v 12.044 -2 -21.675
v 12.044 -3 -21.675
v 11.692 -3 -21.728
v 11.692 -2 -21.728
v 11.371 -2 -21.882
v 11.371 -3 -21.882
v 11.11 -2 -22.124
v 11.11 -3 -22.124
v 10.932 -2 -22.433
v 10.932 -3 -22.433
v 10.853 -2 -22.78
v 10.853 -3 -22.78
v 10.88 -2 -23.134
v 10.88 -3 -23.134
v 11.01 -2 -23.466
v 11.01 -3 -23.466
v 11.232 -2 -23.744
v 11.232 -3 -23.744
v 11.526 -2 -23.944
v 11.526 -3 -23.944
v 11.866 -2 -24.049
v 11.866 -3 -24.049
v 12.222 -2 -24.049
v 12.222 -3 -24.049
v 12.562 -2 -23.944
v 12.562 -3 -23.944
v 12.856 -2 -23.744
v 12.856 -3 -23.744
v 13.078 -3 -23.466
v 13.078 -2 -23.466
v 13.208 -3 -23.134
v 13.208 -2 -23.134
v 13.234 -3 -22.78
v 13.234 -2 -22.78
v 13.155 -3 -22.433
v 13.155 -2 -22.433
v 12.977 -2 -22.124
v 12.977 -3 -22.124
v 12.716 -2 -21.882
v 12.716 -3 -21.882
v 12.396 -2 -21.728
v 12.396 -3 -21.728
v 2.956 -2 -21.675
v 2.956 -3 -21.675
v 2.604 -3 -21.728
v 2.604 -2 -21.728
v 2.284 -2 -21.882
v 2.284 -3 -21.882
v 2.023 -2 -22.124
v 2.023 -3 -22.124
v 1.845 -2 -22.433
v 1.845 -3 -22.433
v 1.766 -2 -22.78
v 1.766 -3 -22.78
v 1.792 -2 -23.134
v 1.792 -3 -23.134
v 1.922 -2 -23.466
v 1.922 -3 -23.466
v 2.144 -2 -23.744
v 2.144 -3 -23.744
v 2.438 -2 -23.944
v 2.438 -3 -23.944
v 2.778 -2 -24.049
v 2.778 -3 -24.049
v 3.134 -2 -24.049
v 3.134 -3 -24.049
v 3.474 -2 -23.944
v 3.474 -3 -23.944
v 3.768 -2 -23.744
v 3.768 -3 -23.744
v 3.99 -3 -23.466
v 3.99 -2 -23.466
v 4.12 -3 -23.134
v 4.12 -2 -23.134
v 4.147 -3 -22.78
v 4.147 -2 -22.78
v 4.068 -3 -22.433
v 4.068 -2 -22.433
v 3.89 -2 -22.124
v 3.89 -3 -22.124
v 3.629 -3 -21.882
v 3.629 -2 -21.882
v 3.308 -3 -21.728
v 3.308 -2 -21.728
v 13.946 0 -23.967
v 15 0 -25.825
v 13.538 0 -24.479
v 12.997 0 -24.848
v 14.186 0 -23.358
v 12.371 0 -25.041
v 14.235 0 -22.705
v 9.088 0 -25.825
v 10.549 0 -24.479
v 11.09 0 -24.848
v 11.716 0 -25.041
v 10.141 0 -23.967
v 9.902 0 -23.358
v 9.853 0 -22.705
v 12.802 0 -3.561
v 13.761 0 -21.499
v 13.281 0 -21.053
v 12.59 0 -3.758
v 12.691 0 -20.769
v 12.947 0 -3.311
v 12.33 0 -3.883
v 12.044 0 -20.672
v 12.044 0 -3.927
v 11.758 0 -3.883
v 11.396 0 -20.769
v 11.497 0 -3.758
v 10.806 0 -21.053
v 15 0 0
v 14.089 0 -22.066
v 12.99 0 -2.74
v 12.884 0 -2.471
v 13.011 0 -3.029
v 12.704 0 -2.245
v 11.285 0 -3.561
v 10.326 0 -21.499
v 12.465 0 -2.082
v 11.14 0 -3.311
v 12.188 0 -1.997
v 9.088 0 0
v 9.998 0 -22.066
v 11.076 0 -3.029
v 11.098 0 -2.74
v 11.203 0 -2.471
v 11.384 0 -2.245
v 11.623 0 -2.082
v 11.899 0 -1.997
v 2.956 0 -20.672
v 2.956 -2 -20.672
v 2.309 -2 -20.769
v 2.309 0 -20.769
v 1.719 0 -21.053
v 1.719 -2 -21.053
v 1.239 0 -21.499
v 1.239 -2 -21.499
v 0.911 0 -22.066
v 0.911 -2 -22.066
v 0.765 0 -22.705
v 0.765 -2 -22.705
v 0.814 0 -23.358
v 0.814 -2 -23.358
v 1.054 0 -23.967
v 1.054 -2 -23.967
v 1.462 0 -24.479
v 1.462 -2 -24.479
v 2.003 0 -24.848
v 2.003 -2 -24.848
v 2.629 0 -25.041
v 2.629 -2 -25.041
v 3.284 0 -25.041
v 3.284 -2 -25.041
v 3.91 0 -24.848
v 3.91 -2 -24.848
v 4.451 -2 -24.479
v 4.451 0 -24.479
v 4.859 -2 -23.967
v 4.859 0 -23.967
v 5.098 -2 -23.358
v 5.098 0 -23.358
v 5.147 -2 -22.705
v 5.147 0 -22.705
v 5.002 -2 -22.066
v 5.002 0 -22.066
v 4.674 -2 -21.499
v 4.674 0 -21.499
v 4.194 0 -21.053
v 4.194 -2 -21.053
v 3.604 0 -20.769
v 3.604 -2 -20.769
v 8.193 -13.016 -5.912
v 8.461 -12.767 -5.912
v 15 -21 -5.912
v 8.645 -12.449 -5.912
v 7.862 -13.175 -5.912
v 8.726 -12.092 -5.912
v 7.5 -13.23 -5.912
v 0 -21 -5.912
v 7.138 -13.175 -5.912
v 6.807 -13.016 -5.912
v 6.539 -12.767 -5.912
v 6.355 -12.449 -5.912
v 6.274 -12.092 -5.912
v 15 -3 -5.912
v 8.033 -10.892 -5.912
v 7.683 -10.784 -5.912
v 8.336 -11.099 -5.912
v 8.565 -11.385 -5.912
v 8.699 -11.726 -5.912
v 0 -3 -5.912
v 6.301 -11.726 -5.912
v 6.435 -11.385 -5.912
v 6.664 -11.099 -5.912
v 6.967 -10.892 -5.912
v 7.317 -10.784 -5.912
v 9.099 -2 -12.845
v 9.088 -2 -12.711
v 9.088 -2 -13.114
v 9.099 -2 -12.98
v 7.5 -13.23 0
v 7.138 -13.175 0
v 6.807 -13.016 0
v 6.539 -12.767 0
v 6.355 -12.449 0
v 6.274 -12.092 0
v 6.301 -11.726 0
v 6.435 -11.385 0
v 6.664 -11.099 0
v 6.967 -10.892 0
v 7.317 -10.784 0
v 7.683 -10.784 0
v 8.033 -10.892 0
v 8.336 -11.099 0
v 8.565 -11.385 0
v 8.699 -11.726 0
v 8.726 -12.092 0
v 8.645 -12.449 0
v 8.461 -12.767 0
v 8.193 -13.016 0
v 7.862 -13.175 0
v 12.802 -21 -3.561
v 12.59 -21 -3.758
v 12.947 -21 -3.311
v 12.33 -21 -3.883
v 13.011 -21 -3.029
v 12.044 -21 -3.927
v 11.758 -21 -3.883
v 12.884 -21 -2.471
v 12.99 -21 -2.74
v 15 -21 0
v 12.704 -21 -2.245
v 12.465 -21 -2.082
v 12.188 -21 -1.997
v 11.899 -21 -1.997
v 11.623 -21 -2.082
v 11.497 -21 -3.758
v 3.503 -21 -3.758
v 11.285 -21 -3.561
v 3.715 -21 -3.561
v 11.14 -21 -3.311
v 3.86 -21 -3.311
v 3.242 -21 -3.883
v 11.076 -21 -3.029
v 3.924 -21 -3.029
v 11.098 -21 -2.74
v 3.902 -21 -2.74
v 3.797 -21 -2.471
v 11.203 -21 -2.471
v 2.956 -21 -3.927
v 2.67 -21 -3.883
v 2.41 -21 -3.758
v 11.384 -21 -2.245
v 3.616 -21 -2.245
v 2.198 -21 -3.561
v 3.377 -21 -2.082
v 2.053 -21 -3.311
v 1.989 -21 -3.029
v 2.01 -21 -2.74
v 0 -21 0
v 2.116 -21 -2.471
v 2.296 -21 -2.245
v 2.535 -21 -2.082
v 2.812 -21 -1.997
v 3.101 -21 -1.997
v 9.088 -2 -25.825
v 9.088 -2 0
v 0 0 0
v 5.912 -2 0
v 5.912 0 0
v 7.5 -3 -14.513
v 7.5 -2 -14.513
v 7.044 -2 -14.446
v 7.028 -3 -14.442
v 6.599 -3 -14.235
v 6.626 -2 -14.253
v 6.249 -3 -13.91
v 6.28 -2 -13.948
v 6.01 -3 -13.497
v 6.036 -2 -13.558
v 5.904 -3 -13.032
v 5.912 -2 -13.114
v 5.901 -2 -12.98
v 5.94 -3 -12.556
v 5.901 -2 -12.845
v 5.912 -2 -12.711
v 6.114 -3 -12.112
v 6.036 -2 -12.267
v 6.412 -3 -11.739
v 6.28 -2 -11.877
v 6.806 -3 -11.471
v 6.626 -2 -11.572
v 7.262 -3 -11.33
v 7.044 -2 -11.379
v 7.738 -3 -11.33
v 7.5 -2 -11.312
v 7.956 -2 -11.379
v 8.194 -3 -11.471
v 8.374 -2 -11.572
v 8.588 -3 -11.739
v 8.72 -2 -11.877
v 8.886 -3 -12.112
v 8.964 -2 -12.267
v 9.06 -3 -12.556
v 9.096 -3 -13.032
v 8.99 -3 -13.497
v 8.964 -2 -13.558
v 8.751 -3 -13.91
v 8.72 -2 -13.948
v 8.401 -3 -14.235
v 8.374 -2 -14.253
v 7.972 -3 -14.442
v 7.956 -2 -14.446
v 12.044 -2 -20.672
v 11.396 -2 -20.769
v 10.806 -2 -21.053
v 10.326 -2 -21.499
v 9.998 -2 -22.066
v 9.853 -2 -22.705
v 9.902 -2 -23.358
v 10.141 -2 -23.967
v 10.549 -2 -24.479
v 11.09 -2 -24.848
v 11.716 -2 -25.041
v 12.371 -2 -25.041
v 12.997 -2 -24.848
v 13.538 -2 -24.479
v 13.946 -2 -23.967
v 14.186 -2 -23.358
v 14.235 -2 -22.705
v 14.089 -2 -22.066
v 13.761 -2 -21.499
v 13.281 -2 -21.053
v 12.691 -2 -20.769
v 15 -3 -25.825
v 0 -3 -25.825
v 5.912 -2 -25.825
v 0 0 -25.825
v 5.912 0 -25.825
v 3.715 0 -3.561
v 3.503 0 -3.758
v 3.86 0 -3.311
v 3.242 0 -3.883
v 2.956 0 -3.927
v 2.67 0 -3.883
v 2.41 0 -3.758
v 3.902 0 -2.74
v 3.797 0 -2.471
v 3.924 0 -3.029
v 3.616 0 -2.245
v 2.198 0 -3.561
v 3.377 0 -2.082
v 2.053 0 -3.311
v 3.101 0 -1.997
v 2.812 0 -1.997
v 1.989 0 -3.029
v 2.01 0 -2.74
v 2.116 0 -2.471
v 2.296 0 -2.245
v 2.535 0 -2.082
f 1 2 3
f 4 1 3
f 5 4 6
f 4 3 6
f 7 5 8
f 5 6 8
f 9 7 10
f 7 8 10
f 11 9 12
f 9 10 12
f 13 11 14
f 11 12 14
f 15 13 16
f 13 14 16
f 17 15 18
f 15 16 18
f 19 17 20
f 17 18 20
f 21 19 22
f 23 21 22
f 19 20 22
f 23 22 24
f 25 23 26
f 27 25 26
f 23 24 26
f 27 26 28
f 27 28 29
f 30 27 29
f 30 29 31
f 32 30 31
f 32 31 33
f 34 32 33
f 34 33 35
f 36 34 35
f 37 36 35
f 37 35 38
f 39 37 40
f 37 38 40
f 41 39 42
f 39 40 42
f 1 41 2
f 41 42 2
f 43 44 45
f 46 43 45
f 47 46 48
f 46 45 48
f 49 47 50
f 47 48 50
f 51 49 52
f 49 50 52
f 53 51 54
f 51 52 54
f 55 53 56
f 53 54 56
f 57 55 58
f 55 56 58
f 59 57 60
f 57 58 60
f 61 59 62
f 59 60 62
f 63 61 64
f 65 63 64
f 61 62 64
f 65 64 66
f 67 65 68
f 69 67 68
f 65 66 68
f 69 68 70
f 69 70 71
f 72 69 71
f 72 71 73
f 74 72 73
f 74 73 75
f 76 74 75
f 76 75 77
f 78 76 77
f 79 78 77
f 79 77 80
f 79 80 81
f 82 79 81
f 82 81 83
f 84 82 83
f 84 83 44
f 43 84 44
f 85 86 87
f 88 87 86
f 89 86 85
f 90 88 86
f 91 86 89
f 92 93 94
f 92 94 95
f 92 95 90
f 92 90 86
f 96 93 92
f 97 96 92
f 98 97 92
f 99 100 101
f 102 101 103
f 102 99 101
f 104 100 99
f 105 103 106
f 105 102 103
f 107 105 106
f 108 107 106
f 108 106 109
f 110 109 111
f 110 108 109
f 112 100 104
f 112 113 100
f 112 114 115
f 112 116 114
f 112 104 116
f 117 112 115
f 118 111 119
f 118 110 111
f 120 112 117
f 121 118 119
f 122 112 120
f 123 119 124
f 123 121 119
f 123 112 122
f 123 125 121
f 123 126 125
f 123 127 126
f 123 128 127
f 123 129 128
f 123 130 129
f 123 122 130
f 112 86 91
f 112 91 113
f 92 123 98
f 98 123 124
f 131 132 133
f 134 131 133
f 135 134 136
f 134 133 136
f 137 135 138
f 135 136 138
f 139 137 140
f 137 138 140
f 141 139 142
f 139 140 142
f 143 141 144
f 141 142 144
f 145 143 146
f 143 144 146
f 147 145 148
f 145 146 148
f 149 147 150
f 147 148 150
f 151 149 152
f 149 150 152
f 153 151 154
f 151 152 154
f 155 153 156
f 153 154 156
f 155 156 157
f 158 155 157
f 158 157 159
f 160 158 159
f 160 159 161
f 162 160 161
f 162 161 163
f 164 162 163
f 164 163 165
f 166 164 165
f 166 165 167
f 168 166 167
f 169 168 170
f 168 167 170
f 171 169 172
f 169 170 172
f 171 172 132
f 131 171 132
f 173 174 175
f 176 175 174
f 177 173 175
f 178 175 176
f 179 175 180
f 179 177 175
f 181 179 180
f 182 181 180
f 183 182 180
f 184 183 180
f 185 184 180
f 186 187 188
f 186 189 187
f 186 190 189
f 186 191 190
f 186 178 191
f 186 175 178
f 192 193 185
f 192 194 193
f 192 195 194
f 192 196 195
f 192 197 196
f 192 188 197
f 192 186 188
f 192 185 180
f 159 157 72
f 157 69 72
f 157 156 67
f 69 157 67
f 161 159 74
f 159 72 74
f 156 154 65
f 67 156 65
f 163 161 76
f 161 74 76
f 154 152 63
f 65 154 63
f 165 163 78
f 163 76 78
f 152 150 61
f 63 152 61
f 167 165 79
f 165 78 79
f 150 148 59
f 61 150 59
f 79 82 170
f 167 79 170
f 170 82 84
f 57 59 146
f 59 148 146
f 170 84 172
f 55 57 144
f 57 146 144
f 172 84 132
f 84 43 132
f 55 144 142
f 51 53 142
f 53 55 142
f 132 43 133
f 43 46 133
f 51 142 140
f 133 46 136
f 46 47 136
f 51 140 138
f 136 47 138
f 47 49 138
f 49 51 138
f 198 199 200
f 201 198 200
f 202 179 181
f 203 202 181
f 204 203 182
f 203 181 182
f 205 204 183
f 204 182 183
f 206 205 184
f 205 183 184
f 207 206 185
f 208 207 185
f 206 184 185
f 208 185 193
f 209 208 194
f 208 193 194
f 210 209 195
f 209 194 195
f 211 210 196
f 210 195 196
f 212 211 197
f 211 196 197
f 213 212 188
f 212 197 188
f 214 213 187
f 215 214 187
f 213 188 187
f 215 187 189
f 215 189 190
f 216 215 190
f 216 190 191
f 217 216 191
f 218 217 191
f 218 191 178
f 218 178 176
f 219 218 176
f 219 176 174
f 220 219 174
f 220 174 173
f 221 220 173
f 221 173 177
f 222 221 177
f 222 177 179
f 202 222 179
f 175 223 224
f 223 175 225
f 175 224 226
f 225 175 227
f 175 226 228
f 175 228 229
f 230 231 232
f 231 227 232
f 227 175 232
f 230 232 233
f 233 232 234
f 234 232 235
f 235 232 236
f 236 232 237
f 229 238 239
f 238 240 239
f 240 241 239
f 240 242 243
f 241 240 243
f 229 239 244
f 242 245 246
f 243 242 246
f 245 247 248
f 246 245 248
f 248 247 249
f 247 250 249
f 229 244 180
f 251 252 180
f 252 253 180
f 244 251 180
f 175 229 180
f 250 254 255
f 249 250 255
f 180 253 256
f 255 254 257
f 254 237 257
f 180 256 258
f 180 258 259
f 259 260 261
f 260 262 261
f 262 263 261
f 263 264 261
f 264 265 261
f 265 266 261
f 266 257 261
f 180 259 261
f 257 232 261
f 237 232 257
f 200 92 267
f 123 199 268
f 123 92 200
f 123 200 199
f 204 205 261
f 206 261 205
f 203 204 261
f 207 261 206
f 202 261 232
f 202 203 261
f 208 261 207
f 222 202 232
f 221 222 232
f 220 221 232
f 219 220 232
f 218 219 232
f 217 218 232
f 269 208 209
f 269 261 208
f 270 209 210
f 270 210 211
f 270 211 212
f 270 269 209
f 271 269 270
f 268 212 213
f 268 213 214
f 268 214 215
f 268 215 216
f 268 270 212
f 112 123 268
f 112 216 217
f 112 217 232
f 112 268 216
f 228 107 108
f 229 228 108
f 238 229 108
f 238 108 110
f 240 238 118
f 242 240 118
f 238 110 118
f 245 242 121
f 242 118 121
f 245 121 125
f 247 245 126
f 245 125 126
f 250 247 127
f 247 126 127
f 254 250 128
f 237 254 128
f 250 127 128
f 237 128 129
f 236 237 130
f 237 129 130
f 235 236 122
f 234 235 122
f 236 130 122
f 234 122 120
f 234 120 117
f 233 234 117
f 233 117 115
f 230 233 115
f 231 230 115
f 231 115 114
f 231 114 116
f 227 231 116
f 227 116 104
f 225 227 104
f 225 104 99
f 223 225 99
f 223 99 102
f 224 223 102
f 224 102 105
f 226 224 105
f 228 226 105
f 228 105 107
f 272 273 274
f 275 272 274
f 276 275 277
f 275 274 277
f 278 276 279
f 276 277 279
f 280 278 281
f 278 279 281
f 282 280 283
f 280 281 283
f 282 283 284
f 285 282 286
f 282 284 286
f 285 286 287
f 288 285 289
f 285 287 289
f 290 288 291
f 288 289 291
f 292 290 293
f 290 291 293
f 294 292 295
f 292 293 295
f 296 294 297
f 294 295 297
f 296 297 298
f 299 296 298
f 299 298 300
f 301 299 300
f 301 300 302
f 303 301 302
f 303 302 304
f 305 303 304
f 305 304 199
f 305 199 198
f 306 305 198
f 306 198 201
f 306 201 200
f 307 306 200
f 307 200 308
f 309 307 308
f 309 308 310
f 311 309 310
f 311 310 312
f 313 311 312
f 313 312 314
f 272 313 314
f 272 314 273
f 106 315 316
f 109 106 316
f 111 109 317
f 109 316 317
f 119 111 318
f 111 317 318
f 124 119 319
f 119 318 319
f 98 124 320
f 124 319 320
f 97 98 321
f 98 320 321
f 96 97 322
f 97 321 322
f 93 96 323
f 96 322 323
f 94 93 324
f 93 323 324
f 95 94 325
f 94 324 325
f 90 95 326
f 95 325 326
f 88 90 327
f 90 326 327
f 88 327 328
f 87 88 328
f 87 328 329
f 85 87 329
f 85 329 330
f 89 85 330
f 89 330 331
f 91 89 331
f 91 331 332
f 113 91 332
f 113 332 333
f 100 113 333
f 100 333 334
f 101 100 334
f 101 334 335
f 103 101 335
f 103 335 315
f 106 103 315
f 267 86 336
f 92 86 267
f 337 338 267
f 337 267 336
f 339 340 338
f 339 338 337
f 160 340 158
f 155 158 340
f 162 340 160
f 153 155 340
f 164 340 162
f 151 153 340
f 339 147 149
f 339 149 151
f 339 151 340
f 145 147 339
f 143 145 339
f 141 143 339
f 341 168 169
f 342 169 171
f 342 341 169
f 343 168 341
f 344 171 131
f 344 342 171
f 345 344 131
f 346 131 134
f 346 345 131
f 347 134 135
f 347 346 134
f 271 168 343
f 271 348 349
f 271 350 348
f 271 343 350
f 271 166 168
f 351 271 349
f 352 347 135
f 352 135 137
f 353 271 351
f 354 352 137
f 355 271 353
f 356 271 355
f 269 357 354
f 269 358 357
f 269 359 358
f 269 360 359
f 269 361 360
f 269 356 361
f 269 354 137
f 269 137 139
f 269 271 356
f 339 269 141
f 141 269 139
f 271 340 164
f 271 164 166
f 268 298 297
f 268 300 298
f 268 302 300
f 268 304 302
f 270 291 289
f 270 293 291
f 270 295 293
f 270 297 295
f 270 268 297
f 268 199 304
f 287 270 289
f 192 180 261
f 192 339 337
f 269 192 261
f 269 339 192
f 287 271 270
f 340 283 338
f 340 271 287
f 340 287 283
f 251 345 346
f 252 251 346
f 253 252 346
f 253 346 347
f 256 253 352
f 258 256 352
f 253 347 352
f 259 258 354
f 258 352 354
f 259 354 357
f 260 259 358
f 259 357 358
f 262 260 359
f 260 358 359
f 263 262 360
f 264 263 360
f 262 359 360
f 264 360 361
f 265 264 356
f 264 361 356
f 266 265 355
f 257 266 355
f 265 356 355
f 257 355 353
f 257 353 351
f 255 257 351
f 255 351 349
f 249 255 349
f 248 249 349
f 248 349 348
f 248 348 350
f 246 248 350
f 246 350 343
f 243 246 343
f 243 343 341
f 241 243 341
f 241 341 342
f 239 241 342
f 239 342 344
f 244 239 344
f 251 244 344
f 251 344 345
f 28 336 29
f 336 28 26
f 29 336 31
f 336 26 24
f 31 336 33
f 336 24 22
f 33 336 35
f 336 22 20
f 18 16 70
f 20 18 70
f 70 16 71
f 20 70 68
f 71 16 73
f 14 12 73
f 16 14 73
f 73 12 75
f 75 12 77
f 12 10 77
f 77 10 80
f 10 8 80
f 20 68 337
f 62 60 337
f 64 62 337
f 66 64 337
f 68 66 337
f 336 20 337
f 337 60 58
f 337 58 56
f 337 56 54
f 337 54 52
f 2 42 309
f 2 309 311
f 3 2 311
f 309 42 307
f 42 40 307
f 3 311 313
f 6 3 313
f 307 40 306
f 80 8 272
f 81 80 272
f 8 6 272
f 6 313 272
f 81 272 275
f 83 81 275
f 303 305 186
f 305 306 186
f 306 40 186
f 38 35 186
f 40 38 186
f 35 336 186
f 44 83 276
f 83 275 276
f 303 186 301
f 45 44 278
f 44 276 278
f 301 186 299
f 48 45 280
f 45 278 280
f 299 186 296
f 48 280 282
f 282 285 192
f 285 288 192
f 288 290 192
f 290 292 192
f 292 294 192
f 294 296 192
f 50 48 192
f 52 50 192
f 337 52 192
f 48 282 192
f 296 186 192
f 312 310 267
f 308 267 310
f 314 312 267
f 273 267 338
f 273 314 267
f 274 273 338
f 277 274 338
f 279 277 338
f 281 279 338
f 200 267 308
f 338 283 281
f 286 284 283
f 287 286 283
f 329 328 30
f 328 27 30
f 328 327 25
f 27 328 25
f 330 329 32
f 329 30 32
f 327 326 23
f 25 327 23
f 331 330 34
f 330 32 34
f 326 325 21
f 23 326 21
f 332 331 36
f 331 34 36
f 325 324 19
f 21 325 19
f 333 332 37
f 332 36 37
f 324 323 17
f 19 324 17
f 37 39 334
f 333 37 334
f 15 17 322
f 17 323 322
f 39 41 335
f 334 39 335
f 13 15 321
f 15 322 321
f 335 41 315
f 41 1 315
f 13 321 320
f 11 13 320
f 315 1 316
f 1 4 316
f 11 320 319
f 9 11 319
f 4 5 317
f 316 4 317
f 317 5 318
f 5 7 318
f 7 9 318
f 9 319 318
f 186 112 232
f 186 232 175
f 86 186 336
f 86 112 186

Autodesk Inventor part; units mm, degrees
ref_plane "YZ Plane" through (0, 0, 0) normal (1, 0, 0) x (0, 1, 0)
ref_plane "XZ Plane" through (0, 0, 0) normal (0, 1, 0) x (-1, 0, 0)
ref_plane "XY Plane" through (0, 0, 0) normal (0, 0, 1) x (1, 0, 0)
sketch "Sketch1" plane through (0, 0, 0) normal (0, 1, 0) x (-1, 0, 0)
  line L0 (0, 0) -> (-15, 0)
  line L1 (-15, 0) -> (-15, -25.825)
  line L2 (-15, -25.825) -> (0, -25.825)
  line L3 (0, -25.825) -> (0, 0)
  line L4 (-7.5, -25.825) -> (-7.5, 0) construction
  circle A0 centre (-7.5, -12.9125) radius 1.5
  line L5 (-15, -5.9125) -> (0, -5.9125)
  line L6 (0, -5.9125) -> (0, -19.9125)
  line L7 (0, -19.9125) -> (-15, -19.9125)
  line L8 (-15, -19.9125) -> (-15, -5.9125)
  line L9 (-15, -5.9125) -> (0, -19.9125) construction
  line L10 (0, -5.9125) -> (-15, -19.9125) construction
  circle A1 centre (-2.9563, -22.8688) radius 1
  circle A2 centre (-12.0437, -22.8688) radius 1
  circle A3 centre (-2.9563, -2.9563) radius 1
  circle A4 centre (-12.0438, -2.9563) radius 1
  line L11 (-5.9125, -25.825) -> (-9.0875, -25.825)
  line L12 (-9.0875, -25.825) -> (-9.0875, 0)
  line L13 (-9.0875, 0) -> (-5.9125, 0)
  line L14 (-5.9125, 0) -> (-5.9125, -25.825)
  line L15 (-5.9125, -25.825) -> (-9.0875, 0) construction
  line L16 (-9.0875, -25.825) -> (-5.9125, 0) construction
  point P0 (-15, -19.9125)
  point P1 (-15, -5.9125)
  point P2 (0, -5.9125)
  point P3 (-5.9125, -25.825)
  point P4 (-9.0875, 0)
  dimension "d0" = 15
  dimension "d2" = 3
  dimension "d3" = 12.9125
  dimension "d4" = 14
  dimension "d5" = 2
  dimension "d6" = 2.9562
  dimension "d7" = 2.9562
  dimension "d8" = 2.9562
  dimension "d9" = 2
  dimension "d11" = 2.9562
  dimension "d12" = 2.9562
  dimension "d13" = 2.9562
  dimension "d25" = 5.9125
  dimension "d68" = 3.175
  dimension "d81" = 25.825
extrude "Extrusion1" add sketch "Sketch1" against normal blind 3 contours L3 L5 L14 L0 | L14 L5 L12 L0 | L3 L7 L14 L5 | L12 L5 L1 L0 | L14 L7 L12 L5 | L3 L2 L14 L7 | L12 L7 L1 L5 | L14 L2 L12 L7 | L12 L2 L1 L7 | A0 | A1 | A2 | A3 | A4
extrude "Extrusion2" add sketch "Sketch1" against normal blind 21 contours L3 L5 L14 L0 | L14 L5 L12 L0 | L12 L5 L1 L0 | A3 | A4
hole "Hole3" at (2.9563, 0, -22.8688) at (12.0437, 0, -22.8688) direction (0, -1, 0) diameter 2.3876 end through all counterbore diameter 4.3942 counterbore depth 2 clearance for "Socket Head Cap Screw" size "M2" standard "Ansi Metric M Profile"
extrude "Extrusion3" cut sketch "Sketch1" against normal blind 2 contours L14 L5 L12 L0 | L14 L7 L12 L5 | L14 L2 L12 L7 | A0
sketch "Sketch3" plane through (0, -21, 0) normal (0, -1, 0) x (1, 0, 0)
  circle A0 centre (12.0437, -2.9563) radius 1
  circle A1 centre (2.9563, -2.9563) radius 1
  line L0 (15, 0) -> (0, 0) projected
  line L1 (15, -5.9125) -> (15, 0) projected
  line L2 (0, 0) -> (0, -5.9125) projected
  dimension "d44" = 2
  dimension "d45" = 2.9562
  dimension "d46" = 2.9562
  dimension "d47" = 2.9562
hole "Hole4" at (12.0437, -21, -2.9563) at (2.9563, -21, -2.9563) direction (0, 1, 0) diameter 1.9406 end through all thread size "3-48 UNC" class "2B" standard "ANSI Unified Screw Threads"
sketch "Sketch4" plane through (0, -3, 0) normal (0, -1, 0) x (1, 0, 0)
  circle A0 centre (7.5, -12.9125) radius 1.5
  point P0 (0, 0)
  dimension "d60" = 3
hole "Hole5" at (7.5, -3, -12.9125) direction (0, 1, 0) diameter 3.2004 depth 1 clearance for "Socket Head Cap Screw" size "M3" standard "Ansi Metric M Profile"
sketch "Sketch5" plane through (0, -21, 0) normal (0, 0, 1) x (1, 0, 0)
  circle A0 centre (7.5, 9) radius 1.5
  line L0 (0, 21) -> (5.9125, 21) projected
  line L1 (0, 21) -> (0, 0) projected
  dimension "d71" = 3
  dimension "d72" = 12
  dimension "d73" = 7.5
hole "Hole6" at (7.5, -12, 0) direction (0, 0, -1) diameter 2.459 end through all thread size "M3x0.5" class "6H" standard "ANSI Metric M Profile"
equation "\"d3\" = 0.5 * d81"
equation "\"d6\" = d7"
equation "\"d7\" = -0.25 * d68 + 0.25 * d0"
equation "\"d8\" = d7"
equation "\"d11\" = d6"
equation "\"d12\" = d7"
equation "\"d13\" = d7"
equation "\"d25\" = 2 * d11"
equation "\"d45\" = d6"
equation "\"d46\" = d13"
equation "\"d47\" = d12"
properties part number "Bearing Sled" material "Aluminum 6061"
